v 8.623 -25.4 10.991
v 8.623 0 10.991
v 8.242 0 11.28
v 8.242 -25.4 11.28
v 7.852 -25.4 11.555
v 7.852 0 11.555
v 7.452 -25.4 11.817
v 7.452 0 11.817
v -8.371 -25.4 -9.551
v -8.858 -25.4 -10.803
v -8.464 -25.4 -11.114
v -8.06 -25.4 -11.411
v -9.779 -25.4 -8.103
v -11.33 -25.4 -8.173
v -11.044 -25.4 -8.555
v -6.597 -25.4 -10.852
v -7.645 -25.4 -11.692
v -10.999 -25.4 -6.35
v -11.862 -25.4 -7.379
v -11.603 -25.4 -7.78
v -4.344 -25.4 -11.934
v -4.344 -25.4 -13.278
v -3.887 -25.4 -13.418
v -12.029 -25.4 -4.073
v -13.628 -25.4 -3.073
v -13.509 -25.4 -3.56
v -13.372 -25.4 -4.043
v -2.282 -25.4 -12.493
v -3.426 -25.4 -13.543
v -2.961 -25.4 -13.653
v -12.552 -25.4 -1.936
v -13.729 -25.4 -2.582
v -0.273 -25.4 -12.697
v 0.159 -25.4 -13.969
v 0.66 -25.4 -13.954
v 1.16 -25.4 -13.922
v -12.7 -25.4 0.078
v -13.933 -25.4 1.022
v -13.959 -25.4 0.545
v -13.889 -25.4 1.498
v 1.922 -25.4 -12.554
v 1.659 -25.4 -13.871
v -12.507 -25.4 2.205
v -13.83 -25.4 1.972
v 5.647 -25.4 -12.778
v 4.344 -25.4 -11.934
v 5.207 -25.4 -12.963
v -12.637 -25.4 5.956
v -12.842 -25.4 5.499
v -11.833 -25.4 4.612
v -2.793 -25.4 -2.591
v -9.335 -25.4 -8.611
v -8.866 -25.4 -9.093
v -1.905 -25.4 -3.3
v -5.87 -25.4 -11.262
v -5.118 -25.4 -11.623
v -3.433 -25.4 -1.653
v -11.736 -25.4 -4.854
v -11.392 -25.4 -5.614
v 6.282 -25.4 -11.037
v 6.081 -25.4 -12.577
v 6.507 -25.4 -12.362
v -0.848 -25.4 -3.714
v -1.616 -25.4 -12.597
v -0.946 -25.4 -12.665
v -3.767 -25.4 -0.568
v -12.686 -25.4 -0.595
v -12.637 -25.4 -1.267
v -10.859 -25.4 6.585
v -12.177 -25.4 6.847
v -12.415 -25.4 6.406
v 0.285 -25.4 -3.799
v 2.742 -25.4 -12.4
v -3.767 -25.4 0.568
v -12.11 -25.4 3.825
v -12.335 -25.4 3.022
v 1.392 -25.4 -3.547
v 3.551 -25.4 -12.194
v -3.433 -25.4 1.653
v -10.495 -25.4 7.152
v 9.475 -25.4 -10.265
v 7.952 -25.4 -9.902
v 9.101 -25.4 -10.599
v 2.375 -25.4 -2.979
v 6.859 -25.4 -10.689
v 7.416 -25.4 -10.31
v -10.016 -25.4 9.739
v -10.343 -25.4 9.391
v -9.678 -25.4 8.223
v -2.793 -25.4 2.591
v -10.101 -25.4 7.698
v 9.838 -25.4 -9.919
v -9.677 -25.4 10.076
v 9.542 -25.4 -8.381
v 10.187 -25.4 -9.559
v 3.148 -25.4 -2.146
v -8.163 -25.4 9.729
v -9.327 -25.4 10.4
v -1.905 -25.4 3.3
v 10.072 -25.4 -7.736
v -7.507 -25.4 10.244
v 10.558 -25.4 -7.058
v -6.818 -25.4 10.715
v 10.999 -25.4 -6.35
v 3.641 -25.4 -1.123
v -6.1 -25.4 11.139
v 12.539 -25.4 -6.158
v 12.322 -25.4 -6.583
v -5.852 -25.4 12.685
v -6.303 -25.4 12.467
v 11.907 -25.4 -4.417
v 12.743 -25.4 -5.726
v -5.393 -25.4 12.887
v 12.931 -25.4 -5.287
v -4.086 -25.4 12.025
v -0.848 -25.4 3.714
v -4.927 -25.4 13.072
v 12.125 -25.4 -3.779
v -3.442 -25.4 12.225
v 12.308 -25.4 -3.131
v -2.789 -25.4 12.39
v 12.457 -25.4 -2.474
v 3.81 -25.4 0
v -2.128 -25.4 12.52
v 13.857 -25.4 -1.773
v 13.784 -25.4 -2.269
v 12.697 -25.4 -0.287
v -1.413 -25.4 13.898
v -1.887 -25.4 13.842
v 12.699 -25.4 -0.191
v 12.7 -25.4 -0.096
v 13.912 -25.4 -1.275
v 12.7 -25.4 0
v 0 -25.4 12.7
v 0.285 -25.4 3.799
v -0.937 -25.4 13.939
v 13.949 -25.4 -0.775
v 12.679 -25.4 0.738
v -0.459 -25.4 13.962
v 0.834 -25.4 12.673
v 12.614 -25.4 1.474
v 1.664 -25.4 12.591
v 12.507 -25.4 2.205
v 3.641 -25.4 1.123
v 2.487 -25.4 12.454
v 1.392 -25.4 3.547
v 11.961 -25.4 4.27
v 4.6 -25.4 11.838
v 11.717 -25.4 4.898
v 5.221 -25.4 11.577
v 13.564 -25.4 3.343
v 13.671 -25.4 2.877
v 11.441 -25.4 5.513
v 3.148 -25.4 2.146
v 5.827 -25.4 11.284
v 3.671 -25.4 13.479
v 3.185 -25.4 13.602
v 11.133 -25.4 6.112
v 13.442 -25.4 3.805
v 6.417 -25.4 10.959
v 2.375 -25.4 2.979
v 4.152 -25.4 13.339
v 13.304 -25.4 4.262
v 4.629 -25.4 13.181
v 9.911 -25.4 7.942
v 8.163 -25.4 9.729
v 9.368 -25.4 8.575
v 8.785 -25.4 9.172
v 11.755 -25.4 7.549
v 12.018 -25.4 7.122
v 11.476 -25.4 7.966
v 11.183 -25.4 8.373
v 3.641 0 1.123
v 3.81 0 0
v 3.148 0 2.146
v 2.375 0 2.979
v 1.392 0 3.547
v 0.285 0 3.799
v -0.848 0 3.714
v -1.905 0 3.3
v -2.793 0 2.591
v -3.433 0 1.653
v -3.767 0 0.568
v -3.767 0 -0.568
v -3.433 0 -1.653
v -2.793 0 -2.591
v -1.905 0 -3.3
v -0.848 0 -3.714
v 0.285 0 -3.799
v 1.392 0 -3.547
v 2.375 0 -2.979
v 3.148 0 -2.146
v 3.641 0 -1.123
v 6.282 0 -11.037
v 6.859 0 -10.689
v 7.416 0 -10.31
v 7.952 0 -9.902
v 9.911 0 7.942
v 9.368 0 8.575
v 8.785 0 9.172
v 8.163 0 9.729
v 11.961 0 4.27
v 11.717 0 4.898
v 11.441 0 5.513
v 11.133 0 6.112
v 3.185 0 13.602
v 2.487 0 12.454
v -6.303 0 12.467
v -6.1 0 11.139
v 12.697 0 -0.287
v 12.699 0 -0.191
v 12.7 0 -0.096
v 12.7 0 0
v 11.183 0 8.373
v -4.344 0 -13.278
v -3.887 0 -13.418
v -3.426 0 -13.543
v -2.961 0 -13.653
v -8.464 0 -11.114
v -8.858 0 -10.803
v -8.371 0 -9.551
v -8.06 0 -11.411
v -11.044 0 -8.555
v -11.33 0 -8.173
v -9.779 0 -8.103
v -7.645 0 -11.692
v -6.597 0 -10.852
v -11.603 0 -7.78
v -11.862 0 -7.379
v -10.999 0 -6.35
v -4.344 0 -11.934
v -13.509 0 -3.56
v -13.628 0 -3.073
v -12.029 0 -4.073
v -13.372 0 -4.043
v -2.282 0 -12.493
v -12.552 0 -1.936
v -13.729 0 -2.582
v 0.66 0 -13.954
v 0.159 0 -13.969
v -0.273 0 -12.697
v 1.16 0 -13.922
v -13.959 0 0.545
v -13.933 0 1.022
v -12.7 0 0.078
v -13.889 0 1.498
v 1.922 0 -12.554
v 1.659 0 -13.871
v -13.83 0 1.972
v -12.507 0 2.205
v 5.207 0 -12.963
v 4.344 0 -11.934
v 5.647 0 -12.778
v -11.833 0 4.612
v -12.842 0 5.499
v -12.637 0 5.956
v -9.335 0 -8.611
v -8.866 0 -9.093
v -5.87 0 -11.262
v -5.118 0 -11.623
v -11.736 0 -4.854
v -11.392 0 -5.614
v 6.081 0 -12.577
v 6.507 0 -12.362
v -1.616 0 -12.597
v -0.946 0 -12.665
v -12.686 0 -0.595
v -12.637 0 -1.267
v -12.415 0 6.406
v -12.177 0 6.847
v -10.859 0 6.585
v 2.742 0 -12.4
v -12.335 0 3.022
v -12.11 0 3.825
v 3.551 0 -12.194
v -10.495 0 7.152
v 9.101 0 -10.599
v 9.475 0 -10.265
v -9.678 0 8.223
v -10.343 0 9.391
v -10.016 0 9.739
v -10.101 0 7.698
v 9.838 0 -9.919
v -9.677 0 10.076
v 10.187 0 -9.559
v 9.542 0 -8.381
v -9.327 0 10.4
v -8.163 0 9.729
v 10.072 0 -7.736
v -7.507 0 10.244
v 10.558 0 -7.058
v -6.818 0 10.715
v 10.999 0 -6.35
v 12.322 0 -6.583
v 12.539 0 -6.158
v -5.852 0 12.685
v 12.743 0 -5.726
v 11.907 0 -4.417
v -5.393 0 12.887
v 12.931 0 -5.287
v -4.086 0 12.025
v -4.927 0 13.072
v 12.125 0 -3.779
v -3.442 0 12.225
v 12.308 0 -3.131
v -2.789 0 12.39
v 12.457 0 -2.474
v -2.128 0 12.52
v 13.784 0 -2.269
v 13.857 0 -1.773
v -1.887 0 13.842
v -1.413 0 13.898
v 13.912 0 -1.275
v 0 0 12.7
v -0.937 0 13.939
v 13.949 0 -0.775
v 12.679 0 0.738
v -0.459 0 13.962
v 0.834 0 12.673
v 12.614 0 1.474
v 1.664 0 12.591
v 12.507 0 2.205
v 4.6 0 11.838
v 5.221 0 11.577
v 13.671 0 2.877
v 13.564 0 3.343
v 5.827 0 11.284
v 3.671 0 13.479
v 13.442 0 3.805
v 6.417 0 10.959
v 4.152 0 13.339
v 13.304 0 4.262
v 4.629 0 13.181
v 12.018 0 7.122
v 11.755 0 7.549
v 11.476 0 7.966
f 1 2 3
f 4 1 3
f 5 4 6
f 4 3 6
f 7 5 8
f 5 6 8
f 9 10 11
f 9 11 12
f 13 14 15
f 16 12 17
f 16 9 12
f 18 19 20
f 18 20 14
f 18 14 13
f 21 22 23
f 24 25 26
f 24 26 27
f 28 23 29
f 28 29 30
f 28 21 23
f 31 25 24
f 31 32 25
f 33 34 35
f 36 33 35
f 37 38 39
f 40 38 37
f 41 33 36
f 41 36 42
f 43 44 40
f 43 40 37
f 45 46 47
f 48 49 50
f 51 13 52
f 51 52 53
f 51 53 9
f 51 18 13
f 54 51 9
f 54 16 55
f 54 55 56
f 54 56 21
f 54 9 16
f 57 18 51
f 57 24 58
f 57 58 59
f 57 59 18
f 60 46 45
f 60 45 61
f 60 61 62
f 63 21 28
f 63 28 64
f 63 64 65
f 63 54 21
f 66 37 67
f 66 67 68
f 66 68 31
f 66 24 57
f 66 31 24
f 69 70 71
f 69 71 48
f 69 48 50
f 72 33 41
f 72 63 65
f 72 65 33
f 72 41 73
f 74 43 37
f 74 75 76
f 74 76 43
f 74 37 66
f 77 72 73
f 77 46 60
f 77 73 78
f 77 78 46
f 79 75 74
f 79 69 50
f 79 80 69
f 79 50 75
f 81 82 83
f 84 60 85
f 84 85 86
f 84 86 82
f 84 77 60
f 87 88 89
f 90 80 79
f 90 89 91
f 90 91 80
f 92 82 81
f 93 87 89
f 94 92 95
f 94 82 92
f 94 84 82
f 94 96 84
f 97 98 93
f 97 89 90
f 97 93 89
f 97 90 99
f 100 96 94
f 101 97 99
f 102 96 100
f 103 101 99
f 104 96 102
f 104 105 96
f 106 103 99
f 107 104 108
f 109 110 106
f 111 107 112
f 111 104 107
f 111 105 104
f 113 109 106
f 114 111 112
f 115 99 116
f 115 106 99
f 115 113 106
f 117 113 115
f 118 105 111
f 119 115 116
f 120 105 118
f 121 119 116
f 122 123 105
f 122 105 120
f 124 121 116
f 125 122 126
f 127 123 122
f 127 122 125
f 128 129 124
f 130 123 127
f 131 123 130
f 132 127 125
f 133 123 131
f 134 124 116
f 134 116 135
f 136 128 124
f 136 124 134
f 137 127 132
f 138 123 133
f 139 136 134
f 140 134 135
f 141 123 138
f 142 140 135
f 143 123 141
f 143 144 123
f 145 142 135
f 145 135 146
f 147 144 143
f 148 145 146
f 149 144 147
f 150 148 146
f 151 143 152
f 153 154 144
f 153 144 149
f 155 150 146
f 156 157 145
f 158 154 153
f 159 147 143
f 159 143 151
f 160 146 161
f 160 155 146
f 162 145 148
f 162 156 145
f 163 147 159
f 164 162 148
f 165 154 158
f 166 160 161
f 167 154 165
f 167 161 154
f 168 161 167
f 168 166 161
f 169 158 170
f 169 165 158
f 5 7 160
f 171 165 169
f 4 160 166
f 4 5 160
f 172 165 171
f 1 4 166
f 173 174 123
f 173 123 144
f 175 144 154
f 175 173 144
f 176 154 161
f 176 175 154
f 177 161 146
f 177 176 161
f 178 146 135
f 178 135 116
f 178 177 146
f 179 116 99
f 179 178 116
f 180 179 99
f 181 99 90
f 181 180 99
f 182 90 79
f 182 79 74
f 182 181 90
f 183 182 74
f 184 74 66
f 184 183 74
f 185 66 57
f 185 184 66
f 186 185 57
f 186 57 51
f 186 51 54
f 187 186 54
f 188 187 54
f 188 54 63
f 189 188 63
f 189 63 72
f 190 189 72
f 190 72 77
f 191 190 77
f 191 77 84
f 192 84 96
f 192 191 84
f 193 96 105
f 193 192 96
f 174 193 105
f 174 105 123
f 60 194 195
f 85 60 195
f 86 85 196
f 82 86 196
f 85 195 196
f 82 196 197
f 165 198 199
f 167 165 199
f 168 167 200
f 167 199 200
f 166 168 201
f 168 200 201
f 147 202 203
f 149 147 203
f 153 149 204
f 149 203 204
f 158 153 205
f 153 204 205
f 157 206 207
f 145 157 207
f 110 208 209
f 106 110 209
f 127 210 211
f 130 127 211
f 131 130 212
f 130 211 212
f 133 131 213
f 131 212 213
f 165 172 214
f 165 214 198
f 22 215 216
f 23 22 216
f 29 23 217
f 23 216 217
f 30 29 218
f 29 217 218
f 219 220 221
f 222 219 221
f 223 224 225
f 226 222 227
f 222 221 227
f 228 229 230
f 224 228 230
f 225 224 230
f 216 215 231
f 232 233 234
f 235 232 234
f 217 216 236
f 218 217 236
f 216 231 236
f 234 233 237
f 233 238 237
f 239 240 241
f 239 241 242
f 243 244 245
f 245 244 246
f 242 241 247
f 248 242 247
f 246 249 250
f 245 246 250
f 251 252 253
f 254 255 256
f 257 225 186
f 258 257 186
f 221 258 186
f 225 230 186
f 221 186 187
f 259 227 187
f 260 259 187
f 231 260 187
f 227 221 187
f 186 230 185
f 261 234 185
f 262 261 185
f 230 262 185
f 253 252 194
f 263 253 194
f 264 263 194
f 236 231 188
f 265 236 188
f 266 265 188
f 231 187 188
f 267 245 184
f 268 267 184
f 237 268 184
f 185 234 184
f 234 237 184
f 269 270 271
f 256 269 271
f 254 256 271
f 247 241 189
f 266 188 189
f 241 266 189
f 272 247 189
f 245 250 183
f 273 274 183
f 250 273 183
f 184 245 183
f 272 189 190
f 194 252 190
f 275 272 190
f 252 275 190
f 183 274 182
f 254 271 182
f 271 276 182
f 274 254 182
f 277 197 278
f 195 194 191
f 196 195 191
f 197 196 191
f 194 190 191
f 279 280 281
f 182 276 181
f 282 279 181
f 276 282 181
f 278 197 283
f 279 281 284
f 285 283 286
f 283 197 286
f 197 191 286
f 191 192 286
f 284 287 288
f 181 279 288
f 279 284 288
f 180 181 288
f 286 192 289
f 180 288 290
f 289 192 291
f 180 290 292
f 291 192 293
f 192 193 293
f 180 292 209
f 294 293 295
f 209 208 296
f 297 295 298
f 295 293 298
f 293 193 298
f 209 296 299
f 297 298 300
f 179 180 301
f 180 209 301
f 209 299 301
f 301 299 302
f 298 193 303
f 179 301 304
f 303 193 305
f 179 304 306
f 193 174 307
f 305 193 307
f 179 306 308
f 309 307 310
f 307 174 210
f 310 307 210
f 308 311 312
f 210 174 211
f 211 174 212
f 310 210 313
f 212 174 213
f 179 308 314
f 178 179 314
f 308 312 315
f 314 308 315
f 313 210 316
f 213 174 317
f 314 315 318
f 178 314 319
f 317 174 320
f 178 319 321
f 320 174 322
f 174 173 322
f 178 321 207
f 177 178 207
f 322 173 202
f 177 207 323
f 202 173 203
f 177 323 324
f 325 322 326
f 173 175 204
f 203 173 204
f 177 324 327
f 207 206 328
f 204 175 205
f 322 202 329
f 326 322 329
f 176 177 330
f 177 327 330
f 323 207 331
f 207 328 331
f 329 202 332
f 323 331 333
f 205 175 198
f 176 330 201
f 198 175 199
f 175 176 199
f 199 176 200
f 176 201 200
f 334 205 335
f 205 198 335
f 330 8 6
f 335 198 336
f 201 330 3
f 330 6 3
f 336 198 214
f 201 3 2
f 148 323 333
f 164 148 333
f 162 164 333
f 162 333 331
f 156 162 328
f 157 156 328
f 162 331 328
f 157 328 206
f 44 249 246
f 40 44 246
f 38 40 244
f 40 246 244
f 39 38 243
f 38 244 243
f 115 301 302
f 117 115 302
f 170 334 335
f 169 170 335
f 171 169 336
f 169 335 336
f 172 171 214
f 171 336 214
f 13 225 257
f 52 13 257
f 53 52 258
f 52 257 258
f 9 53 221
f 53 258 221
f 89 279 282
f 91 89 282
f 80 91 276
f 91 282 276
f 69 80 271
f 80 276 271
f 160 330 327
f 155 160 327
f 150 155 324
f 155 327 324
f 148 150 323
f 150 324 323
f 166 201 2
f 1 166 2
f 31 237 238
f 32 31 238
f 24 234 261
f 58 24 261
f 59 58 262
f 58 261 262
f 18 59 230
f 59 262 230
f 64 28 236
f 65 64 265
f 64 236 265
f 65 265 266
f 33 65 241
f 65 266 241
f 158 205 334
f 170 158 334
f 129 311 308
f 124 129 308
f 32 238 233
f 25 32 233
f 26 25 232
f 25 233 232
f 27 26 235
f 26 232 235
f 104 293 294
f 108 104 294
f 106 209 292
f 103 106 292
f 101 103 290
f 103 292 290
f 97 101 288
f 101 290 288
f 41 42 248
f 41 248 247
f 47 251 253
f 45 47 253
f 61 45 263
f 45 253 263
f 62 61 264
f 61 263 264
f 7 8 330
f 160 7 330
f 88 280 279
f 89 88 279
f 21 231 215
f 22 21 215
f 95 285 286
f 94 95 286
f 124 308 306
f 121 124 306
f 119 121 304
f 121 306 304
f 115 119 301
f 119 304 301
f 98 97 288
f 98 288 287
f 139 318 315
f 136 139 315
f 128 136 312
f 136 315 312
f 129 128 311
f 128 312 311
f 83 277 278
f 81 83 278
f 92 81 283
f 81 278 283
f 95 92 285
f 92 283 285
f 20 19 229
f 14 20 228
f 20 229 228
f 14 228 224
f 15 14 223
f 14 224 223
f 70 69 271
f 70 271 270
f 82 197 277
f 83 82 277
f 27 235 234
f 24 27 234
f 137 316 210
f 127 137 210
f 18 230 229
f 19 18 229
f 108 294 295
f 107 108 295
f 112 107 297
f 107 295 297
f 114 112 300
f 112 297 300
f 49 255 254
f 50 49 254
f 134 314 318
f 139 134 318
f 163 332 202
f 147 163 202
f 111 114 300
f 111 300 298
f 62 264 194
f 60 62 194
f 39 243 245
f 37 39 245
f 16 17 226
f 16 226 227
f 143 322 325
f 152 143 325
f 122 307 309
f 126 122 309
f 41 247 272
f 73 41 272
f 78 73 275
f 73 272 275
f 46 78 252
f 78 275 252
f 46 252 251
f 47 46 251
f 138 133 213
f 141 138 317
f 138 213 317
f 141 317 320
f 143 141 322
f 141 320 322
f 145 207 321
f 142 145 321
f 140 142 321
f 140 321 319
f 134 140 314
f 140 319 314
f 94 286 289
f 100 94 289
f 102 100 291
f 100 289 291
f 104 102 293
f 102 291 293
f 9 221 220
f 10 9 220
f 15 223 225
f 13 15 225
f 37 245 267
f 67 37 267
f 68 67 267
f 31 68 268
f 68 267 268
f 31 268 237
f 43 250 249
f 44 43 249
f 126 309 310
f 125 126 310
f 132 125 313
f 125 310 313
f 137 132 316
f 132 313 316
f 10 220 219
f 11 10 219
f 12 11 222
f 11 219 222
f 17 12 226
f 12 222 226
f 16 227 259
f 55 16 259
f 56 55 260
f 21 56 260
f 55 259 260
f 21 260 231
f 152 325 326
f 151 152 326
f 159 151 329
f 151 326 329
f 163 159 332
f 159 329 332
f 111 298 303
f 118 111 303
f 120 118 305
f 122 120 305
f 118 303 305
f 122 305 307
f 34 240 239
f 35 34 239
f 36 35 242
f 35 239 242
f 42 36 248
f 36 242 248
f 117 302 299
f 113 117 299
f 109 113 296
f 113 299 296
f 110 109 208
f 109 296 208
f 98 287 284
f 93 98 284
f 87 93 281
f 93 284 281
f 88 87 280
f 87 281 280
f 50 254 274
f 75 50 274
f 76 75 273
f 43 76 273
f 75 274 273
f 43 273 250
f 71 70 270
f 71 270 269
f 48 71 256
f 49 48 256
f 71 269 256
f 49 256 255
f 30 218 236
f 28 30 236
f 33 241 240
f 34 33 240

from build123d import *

# Parameters (mm, degrees)
F0_R     = 3.81
F1_DEPTH = 25.4


with BuildPart() as f1:
    # F0 (on Front) → F1 (new body)
    with BuildSketch(Plane.XZ):
        with BuildLine():
            Line((8.163403, 9.728764), (8.622894, 10.991205))
            ThreePointArc((8.622894, 10.991205), (8.047978, 11.418886), (7.451888, 11.816525))
            Line((7.451888, 11.816525), (6.417451, 10.959303))
            ThreePointArc((6.417451, 10.959303), (7.316343, 10.380805), (8.163403, 9.728764))
        make_face()
        with BuildLine():
            ThreePointArc((9.910585, 7.941681), (9.081062, 8.878306), (8.163403, 9.728764))
            ThreePointArc((8.163403, 9.728764), (7.316343, 10.380805), (6.417451, 10.959303))
            ThreePointArc((6.417451, 10.959303), (5.526004, 11.43474), (4.599586, 11.837813))
            ThreePointArc((4.599586, 11.837813), (3.556733, 12.191786), (2.487134, 12.454082))
            ThreePointArc((2.487134, 12.454082), (1.249631, 12.638371), (0, 12.7))
            ThreePointArc((0, 12.7), (-1.068009, 12.655013), (-2.128452, 12.520371))
            ThreePointArc((-2.128452, 12.520371), (-3.116945, 12.311566), (-4.085712, 12.024847))
            ThreePointArc((-4.085712, 12.024847), (-5.112114, 11.625674), (-6.100074, 11.13908))
            ThreePointArc((-6.100074, 11.13908), (-7.166515, 10.484801), (-8.163402, 9.728765))
            ThreePointArc((-8.163402, 9.728765), (-8.952628, 9.0078), (-9.678428, 8.223018))
            ThreePointArc((-9.678428, 8.223018), (-10.30144, 7.427673), (-10.85926, 6.585322))
            ThreePointArc((-10.85926, 6.585322), (-11.388945, 5.619779), (-11.83299, 4.611978))
            ThreePointArc((-11.83299, 4.611978), (-12.22937, 3.425277), (-12.507058, 2.205332))
            ThreePointArc((-12.507058, 2.205332), (-12.648213, 1.145737), (-12.69976, 0.078024))
            ThreePointArc((-12.69976, 0.078024), (-12.665777, -0.93171), (-12.551639, -1.935548))
            ThreePointArc((-12.551639, -1.935548), (-12.336763, -3.015672), (-12.029119, -4.07312))
            ThreePointArc((-12.029119, -4.07312), (-11.569966, -5.236973), (-10.998523, -6.35))
            ThreePointArc((-10.998523, -6.35), (-10.425558, -7.252429), (-9.778733, -8.103479))
            ThreePointArc((-9.778733, -8.103479), (-9.103656, -8.855136), (-8.370967, -9.550754))
            ThreePointArc((-8.370967, -9.550754), (-7.512072, -10.240057), (-6.596689, -10.852359))
            ThreePointArc((-6.596689, -10.852359), (-5.496847, -11.448785), (-4.343656, -11.934096))
            ThreePointArc((-4.343656, -11.934096), (-3.324669, -12.257103), (-2.282129, -12.493274))
            ThreePointArc((-2.282129, -12.493274), (-1.281833, -12.635146), (-0.273426, -12.697056))
            ThreePointArc((-0.273426, -12.697056), (0.827601, -12.673006), (1.922405, -12.553659))
            ThreePointArc((1.922405, -12.553659), (3.148308, -12.303583), (4.343655, -11.934096))
            ThreePointArc((4.343655, -11.934096), (5.331869, -11.526542), (6.28231, -11.037327))
            ThreePointArc((6.28231, -11.037327), (7.139774, -10.50303), (7.952054, -9.902264))
            ThreePointArc((7.952054, -9.902264), (8.78003, -9.176114), (9.541984, -8.380963))
            ThreePointArc((9.541984, -8.380963), (10.320335, -7.401398), (10.998522, -6.35))
            ThreePointArc((10.998522, -6.35), (11.493567, -5.402584), (11.907185, -4.416892))
            ThreePointArc((11.907185, -4.416892), (12.220601, -3.45643), (12.456679, -2.474093))
            ThreePointArc((12.456679, -2.474093), (12.624186, -1.385616), (12.696763, -0.286721))
            ThreePointArc((12.696763, -0.286721), (12.699191, -0.143369), (12.7, 0))
            ThreePointArc((12.7, 0), (12.651673, 1.106878), (12.507059, 2.205331))
            ThreePointArc((12.507059, 2.205331), (12.277297, 3.249303), (11.960557, 4.270256))
            ThreePointArc((11.960557, 4.270256), (11.583274, 5.207472), (11.132686, 6.111734))
            ThreePointArc((11.132686, 6.111734), (10.561344, 7.053226), (9.910585, 7.941681))
        make_face()
        Circle(F0_R, mode=Mode.SUBTRACT)
        with BuildLine():
            Line((11.183078, 8.372554), (9.910585, 7.941681))
            ThreePointArc((9.910585, 7.941681), (10.561344, 7.053226), (11.132686, 6.111734))
            Line((11.132686, 6.111734), (12.018204, 7.122055))
            ThreePointArc((12.018204, 7.122055), (11.617479, 7.758549), (11.183078, 8.372554))
        make_face()
        with BuildLine():
            ThreePointArc((2.487134, 12.454082), (3.556733, 12.191786), (4.599586, 11.837813))
            Line((4.599586, 11.837813), (4.62851, 13.180963))
            ThreePointArc((4.62851, 13.180963), (3.912406, 13.410965), (3.184961, 13.602093))
            Line((3.184961, 13.602093), (2.487134, 12.454082))
        make_face()
        with BuildLine():
            Line((13.303993, 4.262002), (11.960557, 4.270256))
            ThreePointArc((11.960557, 4.270256), (12.277297, 3.249303), (12.507059, 2.205331))
            Line((12.507059, 2.205331), (13.670531, 2.877062))
            ThreePointArc((13.670531, 2.877062), (13.505027, 3.574234), (13.303993, 4.262002))
        make_face()
        with BuildLine():
            ThreePointArc((-2.128452, 12.520371), (-1.068009, 12.655013), (0, 12.7))
            Line((0, 12.7), (-0.459491, 13.962441))
            ThreePointArc((-0.459491, 13.962441), (-1.17481, 13.920514), (-1.887038, 13.841965))
            Line((-1.887038, 13.841965), (-2.128452, 12.520371))
        make_face()
        with BuildLine():
            ThreePointArc((-6.100074, 11.13908), (-5.112114, 11.625674), (-4.085712, 12.024847))
            Line((-4.085712, 12.024847), (-4.926916, 13.072353))
            ThreePointArc((-4.926916, 13.072353), (-5.623325, 12.788241), (-6.303435, 12.467061))
            Line((-6.303435, 12.467061), (-6.100074, 11.13908))
        make_face()
        with BuildLine():
            Line((13.948509, -0.774596), (12.696763, -0.286721))
            ThreePointArc((12.696763, -0.286721), (12.624186, -1.385616), (12.456679, -2.474093))
            Line((12.456679, -2.474093), (13.784447, -2.269342))
            ThreePointArc((13.784447, -2.269342), (13.886604, -1.524178), (13.948509, -0.774596))
        make_face()
        with BuildLine():
            ThreePointArc((-9.678428, 8.223018), (-8.952628, 9.0078), (-8.163402, 9.728765))
            Line((-8.163402, 9.728765), (-9.326875, 10.400496))
            ThreePointArc((-9.326875, 10.400496), (-9.847891, 9.90858), (-10.342999, 9.390595))
            Line((-10.342999, 9.390595), (-9.678428, 8.223018))
        make_face()
        with BuildLine():
            Line((12.931012, -5.286759), (11.907185, -4.416892))
            ThreePointArc((11.907185, -4.416892), (11.493567, -5.402584), (10.998522, -6.35))
            Line((10.998522, -6.35), (12.321574, -6.58329))
            ThreePointArc((12.321574, -6.58329), (12.642924, -5.942842), (12.931012, -5.286759))
        make_face()
        with BuildLine():
            ThreePointArc((-11.83299, 4.611978), (-11.388945, 5.619779), (-10.85926, 6.585322))
            Line((-10.85926, 6.585322), (-12.176983, 6.847043))
            ThreePointArc((-12.176983, 6.847043), (-12.52784, 6.181757), (-12.842383, 5.498553))
            Line((-12.842383, 5.498553), (-11.83299, 4.611978))
        make_face()
        with BuildLine():
            Line((10.187277, -9.559304), (9.541984, -8.380963))
            ThreePointArc((9.541984, -8.380963), (8.78003, -9.176114), (7.952054, -9.902264))
            Line((7.952054, -9.902264), (9.100794, -10.598889))
            ThreePointArc((9.100794, -10.598889), (9.658033, -10.093725), (10.187277, -9.559304))
        make_face()
        with BuildLine():
            ThreePointArc((-12.69976, 0.078024), (-12.648213, 1.145737), (-12.507058, 2.205332))
            Line((-12.507058, 2.205332), (-13.83011, 1.972043))
            ThreePointArc((-13.83011, 1.972043), (-13.913034, 1.26031), (-13.959355, 0.545262))
            Line((-13.959355, 0.545262), (-12.69976, 0.078024))
        make_face()
        with BuildLine():
            Line((6.507467, -12.361787), (6.28231, -11.037327))
            ThreePointArc((6.28231, -11.037327), (5.331869, -11.526542), (4.343655, -11.934096))
            Line((4.343655, -11.934096), (5.207216, -12.963248))
            ThreePointArc((5.207216, -12.963248), (5.865056, -12.679196), (6.507467, -12.361787))
        make_face()
        with BuildLine():
            ThreePointArc((-12.029119, -4.07312), (-12.336763, -3.015672), (-12.551639, -1.935548))
            Line((-12.551639, -1.935548), (-13.729304, -2.582075))
            ThreePointArc((-13.729304, -2.582075), (-13.570439, -3.31724), (-13.372238, -4.042789))
            Line((-13.372238, -4.042789), (-12.029119, -4.07312))
        make_face()
        with BuildLine():
            Line((1.659305, -13.871107), (1.922405, -12.553659))
            ThreePointArc((1.922405, -12.553659), (0.827601, -12.673006), (-0.273426, -12.697056))
            Line((-0.273426, -12.697056), (0.158778, -13.969098))
            ThreePointArc((0.158778, -13.969098), (0.910361, -13.940306), (1.659305, -13.871107))
        make_face()
        with BuildLine():
            ThreePointArc((-9.778733, -8.103479), (-10.425558, -7.252429), (-10.998523, -6.35))
            Line((-10.998523, -6.35), (-11.862084, -7.379151))
            ThreePointArc((-11.862084, -7.379151), (-11.468114, -7.977672), (-11.043974, -8.555205))
            Line((-11.043974, -8.555205), (-9.778733, -8.103479))
        make_face()
        with BuildLine():
            Line((-2.960995, -13.652597), (-2.282129, -12.493274))
            ThreePointArc((-2.282129, -12.493274), (-3.324669, -12.257103), (-4.343656, -11.934096))
            Line((-4.343656, -11.934096), (-4.343656, -13.277558))
            ThreePointArc((-4.343656, -13.277558), (-3.657136, -13.482813), (-2.960995, -13.652597))
        make_face()
        with BuildLine():
            ThreePointArc((-6.596689, -10.852359), (-7.512072, -10.240057), (-8.370967, -9.550754))
            Line((-8.370967, -9.550754), (-8.857532, -10.80301))
            ThreePointArc((-8.857532, -10.80301), (-8.263279, -11.264063), (-7.645074, -11.692465))
            Line((-7.645074, -11.692465), (-6.596689, -10.852359))
        make_face()
    extrude(amount=F1_DEPTH)


solid = f1.part
